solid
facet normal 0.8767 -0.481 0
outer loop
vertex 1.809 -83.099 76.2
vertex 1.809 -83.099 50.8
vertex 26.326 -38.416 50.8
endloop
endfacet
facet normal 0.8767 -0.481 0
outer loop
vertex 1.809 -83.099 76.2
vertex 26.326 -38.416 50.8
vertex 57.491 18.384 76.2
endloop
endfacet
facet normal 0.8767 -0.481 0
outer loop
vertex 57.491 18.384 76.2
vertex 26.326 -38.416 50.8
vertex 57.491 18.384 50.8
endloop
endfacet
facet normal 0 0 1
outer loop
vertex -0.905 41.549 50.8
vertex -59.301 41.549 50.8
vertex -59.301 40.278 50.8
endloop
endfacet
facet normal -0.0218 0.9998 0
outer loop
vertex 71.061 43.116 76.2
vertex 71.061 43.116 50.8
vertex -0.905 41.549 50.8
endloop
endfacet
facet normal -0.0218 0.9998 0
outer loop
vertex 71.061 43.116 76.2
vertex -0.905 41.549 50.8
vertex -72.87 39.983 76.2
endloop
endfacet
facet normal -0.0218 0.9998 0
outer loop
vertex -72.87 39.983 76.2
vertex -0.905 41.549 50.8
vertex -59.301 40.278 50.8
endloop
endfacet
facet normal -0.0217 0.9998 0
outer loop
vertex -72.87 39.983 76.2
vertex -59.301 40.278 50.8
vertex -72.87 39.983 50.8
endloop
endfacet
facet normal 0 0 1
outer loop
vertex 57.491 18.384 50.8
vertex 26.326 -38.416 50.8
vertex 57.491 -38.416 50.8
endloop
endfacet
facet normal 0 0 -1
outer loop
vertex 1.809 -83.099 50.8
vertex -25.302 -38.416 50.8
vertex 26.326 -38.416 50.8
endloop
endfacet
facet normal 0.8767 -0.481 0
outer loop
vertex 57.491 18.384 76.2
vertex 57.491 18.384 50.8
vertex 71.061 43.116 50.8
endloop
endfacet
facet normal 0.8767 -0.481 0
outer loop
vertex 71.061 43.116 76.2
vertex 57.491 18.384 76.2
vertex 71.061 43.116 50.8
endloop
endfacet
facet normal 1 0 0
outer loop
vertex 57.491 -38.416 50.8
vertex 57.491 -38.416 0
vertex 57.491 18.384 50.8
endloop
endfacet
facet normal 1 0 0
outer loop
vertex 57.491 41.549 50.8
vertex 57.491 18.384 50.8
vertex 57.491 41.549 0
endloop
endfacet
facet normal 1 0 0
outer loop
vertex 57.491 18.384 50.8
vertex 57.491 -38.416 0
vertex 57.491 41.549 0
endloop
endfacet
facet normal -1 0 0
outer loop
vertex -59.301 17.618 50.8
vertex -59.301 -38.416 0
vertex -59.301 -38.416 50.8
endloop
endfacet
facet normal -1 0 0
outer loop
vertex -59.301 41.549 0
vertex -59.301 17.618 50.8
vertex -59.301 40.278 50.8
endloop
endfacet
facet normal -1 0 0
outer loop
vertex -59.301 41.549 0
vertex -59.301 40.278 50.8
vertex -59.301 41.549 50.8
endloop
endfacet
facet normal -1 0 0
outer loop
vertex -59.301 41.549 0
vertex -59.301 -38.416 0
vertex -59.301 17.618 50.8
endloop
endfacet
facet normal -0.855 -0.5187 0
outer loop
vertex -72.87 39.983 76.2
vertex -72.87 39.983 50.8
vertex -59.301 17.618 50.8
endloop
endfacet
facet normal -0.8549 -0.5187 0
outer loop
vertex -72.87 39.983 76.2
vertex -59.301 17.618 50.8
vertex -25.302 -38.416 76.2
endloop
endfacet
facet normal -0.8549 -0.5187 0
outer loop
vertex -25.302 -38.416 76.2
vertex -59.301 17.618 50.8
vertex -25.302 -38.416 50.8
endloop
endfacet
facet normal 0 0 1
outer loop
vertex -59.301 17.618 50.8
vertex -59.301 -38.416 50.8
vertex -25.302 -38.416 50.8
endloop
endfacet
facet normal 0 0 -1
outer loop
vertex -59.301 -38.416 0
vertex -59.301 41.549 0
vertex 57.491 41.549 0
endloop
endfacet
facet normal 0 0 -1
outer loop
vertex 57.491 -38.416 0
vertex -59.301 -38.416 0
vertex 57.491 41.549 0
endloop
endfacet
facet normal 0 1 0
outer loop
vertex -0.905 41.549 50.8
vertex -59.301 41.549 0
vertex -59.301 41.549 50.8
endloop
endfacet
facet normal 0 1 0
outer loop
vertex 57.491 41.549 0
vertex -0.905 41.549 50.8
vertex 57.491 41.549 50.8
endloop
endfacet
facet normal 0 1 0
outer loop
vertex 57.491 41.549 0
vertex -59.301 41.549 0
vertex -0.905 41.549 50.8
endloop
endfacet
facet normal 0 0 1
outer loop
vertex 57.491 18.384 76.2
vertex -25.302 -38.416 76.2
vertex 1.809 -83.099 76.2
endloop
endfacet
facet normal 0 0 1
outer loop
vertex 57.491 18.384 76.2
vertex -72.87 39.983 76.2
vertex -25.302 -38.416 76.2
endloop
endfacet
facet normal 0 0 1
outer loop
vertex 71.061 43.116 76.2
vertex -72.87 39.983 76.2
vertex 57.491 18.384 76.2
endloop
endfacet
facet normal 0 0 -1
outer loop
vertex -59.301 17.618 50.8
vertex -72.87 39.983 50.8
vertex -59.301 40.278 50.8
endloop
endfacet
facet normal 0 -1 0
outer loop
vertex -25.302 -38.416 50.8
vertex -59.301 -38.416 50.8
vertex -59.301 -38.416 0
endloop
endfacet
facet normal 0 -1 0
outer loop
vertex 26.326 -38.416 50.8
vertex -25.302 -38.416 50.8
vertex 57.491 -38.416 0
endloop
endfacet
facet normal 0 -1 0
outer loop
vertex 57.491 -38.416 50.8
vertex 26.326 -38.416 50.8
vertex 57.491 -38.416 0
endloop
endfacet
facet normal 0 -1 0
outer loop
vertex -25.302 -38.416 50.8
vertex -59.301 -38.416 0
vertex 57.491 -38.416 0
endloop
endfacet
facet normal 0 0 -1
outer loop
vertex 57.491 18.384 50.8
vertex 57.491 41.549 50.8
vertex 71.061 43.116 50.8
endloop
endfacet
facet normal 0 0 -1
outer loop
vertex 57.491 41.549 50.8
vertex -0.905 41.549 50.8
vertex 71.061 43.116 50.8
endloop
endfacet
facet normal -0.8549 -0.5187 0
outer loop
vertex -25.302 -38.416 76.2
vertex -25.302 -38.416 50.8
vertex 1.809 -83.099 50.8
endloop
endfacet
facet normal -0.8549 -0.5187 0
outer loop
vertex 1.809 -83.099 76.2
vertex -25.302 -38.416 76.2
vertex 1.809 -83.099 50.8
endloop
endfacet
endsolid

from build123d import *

# Parameters (mm, degrees)
F0_W     = 116.791695822
F0_H     = 79.9650549889
F1_DEPTH = 50.8
F3_DEPTH = 25.4


with BuildPart() as f1:
    # F0 (on Top) → F1 (new body)
    with BuildSketch(Plane.XY):
        with Locations((-0.9046609048, 1.5669167042)):
            Rectangle(F0_W, F0_H)
    extrude(amount=F1_DEPTH)

    # F2 (on face) → F3 (join)
    with BuildSketch(Plane.XY.offset(50.8)):
        Polygon((26.3261360564, -38.4156107903), (-25.3022870765, -38.4156107903), (1.8093218096, -83.0988883972), align=None)
        Polygon((-0.9046609047, 41.5494441986), (-59.3005088158, 40.2779845768), (-59.3005088158, 17.6176547568), (-25.3022870765, -38.4156107903), (26.3261360564, -38.4156107903), (57.4911870062, 18.3844534107), (57.4911870062, 41.5494441986), align=None)
        Polygon((71.0610874735, 43.1163628493), (-0.9046609047, 41.5494441986), (57.4911870062, 41.5494441986), (57.4911870062, 18.3844534107), align=None)
        Polygon((-59.3005088158, 40.2779845768), (-72.870409283, 39.9825255479), (-59.3005088158, 17.6176547568), align=None)
    extrude(amount=F3_DEPTH)


solid = f1.part
